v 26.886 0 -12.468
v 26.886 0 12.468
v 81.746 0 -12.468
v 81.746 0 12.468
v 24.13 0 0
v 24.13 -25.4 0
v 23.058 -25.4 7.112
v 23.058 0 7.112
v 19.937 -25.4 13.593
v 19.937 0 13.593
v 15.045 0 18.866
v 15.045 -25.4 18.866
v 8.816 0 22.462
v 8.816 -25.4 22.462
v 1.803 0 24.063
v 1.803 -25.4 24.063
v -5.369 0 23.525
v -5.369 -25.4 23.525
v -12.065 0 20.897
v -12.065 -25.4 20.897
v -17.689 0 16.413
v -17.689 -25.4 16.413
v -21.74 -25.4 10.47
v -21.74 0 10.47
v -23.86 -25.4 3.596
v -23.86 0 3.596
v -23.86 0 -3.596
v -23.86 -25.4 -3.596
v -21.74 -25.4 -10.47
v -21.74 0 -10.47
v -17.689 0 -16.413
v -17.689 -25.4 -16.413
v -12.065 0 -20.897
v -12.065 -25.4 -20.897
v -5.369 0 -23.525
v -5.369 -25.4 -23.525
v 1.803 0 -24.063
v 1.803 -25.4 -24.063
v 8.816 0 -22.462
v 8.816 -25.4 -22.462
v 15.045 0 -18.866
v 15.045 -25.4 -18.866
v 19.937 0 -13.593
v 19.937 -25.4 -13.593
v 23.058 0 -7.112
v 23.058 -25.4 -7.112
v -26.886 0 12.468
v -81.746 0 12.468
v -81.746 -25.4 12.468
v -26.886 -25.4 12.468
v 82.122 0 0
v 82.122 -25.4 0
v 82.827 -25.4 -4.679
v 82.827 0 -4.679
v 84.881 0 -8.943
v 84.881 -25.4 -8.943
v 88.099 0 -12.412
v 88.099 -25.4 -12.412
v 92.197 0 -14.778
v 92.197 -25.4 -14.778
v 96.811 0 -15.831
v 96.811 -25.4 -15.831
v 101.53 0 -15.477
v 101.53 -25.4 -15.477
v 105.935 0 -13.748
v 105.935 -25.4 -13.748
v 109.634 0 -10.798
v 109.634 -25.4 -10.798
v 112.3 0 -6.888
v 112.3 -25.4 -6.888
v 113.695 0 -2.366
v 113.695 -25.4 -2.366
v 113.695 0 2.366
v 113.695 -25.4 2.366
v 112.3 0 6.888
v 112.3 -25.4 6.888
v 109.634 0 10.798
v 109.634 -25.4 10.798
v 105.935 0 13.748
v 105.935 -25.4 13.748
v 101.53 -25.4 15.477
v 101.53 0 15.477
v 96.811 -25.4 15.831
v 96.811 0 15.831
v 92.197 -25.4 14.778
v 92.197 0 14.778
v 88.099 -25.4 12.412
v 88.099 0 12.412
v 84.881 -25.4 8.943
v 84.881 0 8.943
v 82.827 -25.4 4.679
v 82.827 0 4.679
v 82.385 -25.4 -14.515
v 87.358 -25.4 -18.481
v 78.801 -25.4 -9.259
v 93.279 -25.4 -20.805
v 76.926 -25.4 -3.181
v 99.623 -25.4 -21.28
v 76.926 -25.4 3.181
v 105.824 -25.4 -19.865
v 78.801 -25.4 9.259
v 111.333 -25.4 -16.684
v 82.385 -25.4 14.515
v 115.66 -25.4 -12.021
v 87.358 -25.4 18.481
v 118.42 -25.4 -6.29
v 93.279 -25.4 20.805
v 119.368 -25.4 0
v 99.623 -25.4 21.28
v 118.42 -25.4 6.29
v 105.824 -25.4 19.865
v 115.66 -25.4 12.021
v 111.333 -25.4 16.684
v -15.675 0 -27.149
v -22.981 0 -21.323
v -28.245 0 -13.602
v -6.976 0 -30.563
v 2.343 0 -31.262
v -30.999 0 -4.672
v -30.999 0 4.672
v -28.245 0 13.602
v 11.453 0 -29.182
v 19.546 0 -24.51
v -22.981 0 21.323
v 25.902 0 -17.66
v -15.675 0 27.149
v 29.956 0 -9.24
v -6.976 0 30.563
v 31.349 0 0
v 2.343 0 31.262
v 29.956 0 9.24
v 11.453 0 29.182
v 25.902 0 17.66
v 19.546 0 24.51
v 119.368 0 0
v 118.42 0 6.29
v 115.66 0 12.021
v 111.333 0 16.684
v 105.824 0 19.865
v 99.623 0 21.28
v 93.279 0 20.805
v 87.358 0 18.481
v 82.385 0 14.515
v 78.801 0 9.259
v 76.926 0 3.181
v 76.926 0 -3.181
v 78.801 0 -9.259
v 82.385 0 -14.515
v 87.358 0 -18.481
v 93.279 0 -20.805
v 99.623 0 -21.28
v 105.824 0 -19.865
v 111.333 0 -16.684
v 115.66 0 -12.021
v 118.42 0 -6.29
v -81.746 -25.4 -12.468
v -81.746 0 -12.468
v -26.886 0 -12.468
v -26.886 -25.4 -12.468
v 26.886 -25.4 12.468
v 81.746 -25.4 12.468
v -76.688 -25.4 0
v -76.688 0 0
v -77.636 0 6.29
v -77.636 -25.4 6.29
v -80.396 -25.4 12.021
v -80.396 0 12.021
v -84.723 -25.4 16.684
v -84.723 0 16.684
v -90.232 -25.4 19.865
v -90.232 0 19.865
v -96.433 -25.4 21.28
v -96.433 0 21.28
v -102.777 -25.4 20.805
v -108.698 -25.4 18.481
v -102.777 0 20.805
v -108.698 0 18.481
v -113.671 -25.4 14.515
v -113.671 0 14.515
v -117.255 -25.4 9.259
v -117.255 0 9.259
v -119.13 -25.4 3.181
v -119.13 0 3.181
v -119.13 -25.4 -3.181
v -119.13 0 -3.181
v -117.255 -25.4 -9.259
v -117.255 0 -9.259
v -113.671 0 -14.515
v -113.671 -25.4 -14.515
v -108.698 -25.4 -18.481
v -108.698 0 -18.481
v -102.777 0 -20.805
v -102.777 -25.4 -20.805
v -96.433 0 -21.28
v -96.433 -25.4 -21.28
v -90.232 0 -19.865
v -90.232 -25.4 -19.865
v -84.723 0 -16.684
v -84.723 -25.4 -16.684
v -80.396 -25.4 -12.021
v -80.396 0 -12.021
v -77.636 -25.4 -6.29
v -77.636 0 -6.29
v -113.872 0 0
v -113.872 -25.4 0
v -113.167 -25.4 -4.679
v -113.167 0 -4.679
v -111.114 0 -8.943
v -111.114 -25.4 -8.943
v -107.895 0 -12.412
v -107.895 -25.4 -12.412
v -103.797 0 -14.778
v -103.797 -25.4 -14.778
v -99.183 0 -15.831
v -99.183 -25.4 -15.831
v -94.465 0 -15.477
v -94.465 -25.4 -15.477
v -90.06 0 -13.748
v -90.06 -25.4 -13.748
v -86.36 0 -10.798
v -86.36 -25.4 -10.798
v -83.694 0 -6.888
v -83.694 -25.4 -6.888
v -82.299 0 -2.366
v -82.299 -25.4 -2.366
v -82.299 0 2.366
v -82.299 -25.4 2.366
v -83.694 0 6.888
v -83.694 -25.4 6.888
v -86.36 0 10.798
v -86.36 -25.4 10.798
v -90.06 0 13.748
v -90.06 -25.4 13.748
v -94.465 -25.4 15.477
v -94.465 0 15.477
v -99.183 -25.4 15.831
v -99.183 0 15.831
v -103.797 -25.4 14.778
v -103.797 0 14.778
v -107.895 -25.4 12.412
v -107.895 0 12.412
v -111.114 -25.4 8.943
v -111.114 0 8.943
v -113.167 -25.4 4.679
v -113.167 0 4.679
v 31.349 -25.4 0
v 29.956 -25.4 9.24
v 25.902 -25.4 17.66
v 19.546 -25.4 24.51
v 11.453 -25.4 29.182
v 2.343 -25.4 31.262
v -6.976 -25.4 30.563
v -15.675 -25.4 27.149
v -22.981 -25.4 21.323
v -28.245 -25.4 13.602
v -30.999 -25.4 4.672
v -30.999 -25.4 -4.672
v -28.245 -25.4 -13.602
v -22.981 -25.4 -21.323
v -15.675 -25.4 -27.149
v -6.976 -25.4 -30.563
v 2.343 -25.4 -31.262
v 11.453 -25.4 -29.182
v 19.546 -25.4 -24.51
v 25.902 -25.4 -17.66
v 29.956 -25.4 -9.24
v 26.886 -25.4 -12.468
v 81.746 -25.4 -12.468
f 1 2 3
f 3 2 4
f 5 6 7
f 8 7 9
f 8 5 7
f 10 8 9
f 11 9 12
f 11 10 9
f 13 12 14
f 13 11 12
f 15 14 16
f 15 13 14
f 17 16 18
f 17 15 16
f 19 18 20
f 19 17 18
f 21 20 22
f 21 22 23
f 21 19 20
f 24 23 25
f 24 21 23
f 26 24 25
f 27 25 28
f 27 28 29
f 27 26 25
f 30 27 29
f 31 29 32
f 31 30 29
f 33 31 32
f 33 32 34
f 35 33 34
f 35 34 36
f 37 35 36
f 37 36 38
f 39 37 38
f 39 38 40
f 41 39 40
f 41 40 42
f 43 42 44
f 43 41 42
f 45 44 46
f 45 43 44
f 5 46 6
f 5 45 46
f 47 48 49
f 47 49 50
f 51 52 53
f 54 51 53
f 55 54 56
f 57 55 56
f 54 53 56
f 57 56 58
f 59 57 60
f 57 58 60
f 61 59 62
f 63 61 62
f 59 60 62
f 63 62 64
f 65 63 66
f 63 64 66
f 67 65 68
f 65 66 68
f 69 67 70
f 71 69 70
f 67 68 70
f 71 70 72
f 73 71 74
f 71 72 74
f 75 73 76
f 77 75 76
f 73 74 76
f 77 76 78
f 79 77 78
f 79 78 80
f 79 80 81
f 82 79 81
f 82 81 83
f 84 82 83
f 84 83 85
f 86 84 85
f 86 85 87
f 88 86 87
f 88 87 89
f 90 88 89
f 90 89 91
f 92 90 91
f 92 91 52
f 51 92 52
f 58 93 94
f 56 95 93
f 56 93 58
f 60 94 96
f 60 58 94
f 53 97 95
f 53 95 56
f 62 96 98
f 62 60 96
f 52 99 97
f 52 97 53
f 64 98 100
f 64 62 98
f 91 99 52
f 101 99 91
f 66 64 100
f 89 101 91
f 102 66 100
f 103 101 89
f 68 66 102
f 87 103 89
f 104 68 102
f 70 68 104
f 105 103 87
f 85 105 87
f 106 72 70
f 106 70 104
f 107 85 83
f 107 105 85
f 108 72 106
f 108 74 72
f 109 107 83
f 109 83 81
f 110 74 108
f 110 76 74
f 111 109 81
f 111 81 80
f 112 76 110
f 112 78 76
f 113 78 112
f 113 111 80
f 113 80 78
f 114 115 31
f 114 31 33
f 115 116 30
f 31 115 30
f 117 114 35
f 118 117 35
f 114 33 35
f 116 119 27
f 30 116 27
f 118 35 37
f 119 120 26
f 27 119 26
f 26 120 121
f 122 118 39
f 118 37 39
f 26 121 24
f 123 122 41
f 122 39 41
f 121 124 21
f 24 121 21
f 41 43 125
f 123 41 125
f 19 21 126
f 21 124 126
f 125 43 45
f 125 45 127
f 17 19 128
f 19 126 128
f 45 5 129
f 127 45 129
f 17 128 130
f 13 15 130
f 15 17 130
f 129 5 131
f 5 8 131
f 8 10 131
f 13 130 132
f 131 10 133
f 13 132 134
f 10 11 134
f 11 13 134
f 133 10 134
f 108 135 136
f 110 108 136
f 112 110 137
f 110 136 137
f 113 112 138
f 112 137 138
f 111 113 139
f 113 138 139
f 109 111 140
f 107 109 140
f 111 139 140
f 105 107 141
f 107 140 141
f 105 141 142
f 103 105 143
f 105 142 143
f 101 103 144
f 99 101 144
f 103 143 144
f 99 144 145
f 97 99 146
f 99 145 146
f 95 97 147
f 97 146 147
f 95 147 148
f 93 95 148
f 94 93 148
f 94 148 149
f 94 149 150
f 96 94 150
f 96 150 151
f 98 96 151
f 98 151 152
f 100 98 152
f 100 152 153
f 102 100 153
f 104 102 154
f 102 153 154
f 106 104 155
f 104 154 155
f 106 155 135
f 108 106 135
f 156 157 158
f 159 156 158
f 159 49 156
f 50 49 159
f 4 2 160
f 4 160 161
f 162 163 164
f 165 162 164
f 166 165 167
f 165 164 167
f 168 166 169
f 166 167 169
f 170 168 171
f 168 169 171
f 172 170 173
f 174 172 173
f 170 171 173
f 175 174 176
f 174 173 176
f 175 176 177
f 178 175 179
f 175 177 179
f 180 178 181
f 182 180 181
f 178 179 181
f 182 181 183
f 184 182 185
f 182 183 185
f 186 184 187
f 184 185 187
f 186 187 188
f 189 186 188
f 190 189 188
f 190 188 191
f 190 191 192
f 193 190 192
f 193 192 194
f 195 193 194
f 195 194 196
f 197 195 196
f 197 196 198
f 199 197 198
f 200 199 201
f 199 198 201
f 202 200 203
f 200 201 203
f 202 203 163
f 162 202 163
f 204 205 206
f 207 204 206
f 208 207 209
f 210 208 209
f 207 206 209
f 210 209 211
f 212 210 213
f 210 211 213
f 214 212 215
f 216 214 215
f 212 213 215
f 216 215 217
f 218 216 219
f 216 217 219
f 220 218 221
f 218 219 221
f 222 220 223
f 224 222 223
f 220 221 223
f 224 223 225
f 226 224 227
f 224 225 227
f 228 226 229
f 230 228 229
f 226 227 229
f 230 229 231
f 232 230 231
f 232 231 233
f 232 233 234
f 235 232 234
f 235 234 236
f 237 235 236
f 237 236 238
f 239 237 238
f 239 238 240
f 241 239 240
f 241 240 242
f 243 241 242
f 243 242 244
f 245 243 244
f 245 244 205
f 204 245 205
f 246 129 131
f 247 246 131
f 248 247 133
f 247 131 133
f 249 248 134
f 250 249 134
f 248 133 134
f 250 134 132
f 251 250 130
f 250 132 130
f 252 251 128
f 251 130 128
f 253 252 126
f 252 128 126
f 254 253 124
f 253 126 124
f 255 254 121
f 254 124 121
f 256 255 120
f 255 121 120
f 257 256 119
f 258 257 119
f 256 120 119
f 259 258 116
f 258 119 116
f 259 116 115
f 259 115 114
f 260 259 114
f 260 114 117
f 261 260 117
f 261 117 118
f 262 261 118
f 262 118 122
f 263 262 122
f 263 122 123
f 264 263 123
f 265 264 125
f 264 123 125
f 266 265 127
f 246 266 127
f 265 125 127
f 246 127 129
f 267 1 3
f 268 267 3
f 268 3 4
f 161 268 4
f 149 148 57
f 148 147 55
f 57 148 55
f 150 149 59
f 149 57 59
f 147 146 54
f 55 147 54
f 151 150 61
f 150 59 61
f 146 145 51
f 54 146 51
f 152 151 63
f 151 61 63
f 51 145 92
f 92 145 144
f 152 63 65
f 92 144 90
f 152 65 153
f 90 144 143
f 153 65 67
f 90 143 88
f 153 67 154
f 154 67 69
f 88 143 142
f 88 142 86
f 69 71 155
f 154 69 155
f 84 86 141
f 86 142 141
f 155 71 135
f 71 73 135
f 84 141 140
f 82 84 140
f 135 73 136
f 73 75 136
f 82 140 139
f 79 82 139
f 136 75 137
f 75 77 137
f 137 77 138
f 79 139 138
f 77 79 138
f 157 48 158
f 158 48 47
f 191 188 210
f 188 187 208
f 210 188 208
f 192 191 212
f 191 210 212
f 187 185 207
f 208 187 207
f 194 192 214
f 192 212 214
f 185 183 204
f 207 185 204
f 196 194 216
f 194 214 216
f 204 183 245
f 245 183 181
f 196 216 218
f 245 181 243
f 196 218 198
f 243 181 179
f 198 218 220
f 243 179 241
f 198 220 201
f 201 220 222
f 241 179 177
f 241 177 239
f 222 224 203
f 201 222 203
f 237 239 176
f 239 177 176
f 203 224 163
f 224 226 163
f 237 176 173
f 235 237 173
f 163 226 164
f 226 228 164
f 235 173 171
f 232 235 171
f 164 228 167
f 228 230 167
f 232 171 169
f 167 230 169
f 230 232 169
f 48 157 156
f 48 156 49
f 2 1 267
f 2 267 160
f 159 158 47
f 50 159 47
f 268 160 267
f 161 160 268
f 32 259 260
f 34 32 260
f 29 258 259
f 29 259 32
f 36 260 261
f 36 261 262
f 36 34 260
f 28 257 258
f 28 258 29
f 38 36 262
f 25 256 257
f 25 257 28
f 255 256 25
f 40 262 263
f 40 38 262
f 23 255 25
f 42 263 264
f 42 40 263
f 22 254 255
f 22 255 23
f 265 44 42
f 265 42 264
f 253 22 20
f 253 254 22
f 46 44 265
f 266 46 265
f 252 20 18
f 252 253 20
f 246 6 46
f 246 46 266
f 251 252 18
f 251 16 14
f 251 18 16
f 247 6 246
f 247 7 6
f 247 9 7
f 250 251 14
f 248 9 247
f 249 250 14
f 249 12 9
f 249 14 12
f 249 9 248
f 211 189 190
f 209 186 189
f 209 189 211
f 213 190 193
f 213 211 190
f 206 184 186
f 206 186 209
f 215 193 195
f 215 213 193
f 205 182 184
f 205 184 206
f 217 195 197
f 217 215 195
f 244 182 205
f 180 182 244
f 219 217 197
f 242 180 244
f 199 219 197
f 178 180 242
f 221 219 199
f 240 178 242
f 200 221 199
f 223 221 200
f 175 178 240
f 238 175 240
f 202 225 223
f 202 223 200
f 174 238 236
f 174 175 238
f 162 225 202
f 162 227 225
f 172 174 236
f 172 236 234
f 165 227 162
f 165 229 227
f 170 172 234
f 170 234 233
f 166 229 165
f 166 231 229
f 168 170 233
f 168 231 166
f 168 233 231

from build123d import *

# Parameters (mm, degrees)
F1_R     = 21.3399819069
F4_DEPTH = 25.4
F3_W     = 54.8592060804
F3_H     = 24.9362587929
F0_R     = 31.349181605
F0_R_2   = 24.13
F5_D     = 31.75
F5_2_D   = 31.75


with BuildPart() as f4:
    # F1 (on Front) → F4 (new body)
    with BuildSketch(Plane.XZ):
        with Locations((-98.0279445648, 0)):
            Circle(F1_R)
    extrude(amount=F4_DEPTH)

    # F5 (through all)
    with Locations(Plane(origin=(0, 0, 0), x_dir=(1, 0, 0), z_dir=(0, 1, 0))):
        with Locations((97.9970778847, 0), (-97.9970778847, 0)):
            Hole(F5_D / 2)


with BuildPart() as f4b:
    # F1 (on Front) → F4, piece 2 (new body)
    with BuildSketch(Plane.XZ):
        with Locations((98.0279445648, 0)):
            Circle(F1_R)
    extrude(amount=F4_DEPTH)

    # F5#2 (through all)
    with Locations(Plane(origin=(0, 0, 0), x_dir=(1, 0, 0), z_dir=(0, 1, 0))):
        with Locations((97.9970778847, 0), (-97.9970778847, 0)):
            Hole(F5_2_D / 2)


with BuildPart() as f4c:
    # F3 (on Front) → F4, piece 3 (new body)
    with BuildSketch(Plane.XZ):
        with Locations((-54.3159097433, 0)):
            Rectangle(F3_W, F3_H)
    extrude(amount=F4_DEPTH)


with BuildPart() as f4d:
    # F3 (on Front) → F4, piece 4 (new body)
    with BuildSketch(Plane.XZ):
        with Locations((54.3159097433, 0)):
            Rectangle(F3_W, F3_H)
    extrude(amount=F4_DEPTH)


with BuildPart() as f4e:
    # F0 (on Front) → F4, piece 5 (new body)
    with BuildSketch(Plane.XZ):
        Circle(F0_R)
        Circle(F0_R_2, mode=Mode.SUBTRACT)
    extrude(amount=F4_DEPTH)


solid = Compound([f4.part, f4b.part, f4c.part, f4d.part, f4e.part])
